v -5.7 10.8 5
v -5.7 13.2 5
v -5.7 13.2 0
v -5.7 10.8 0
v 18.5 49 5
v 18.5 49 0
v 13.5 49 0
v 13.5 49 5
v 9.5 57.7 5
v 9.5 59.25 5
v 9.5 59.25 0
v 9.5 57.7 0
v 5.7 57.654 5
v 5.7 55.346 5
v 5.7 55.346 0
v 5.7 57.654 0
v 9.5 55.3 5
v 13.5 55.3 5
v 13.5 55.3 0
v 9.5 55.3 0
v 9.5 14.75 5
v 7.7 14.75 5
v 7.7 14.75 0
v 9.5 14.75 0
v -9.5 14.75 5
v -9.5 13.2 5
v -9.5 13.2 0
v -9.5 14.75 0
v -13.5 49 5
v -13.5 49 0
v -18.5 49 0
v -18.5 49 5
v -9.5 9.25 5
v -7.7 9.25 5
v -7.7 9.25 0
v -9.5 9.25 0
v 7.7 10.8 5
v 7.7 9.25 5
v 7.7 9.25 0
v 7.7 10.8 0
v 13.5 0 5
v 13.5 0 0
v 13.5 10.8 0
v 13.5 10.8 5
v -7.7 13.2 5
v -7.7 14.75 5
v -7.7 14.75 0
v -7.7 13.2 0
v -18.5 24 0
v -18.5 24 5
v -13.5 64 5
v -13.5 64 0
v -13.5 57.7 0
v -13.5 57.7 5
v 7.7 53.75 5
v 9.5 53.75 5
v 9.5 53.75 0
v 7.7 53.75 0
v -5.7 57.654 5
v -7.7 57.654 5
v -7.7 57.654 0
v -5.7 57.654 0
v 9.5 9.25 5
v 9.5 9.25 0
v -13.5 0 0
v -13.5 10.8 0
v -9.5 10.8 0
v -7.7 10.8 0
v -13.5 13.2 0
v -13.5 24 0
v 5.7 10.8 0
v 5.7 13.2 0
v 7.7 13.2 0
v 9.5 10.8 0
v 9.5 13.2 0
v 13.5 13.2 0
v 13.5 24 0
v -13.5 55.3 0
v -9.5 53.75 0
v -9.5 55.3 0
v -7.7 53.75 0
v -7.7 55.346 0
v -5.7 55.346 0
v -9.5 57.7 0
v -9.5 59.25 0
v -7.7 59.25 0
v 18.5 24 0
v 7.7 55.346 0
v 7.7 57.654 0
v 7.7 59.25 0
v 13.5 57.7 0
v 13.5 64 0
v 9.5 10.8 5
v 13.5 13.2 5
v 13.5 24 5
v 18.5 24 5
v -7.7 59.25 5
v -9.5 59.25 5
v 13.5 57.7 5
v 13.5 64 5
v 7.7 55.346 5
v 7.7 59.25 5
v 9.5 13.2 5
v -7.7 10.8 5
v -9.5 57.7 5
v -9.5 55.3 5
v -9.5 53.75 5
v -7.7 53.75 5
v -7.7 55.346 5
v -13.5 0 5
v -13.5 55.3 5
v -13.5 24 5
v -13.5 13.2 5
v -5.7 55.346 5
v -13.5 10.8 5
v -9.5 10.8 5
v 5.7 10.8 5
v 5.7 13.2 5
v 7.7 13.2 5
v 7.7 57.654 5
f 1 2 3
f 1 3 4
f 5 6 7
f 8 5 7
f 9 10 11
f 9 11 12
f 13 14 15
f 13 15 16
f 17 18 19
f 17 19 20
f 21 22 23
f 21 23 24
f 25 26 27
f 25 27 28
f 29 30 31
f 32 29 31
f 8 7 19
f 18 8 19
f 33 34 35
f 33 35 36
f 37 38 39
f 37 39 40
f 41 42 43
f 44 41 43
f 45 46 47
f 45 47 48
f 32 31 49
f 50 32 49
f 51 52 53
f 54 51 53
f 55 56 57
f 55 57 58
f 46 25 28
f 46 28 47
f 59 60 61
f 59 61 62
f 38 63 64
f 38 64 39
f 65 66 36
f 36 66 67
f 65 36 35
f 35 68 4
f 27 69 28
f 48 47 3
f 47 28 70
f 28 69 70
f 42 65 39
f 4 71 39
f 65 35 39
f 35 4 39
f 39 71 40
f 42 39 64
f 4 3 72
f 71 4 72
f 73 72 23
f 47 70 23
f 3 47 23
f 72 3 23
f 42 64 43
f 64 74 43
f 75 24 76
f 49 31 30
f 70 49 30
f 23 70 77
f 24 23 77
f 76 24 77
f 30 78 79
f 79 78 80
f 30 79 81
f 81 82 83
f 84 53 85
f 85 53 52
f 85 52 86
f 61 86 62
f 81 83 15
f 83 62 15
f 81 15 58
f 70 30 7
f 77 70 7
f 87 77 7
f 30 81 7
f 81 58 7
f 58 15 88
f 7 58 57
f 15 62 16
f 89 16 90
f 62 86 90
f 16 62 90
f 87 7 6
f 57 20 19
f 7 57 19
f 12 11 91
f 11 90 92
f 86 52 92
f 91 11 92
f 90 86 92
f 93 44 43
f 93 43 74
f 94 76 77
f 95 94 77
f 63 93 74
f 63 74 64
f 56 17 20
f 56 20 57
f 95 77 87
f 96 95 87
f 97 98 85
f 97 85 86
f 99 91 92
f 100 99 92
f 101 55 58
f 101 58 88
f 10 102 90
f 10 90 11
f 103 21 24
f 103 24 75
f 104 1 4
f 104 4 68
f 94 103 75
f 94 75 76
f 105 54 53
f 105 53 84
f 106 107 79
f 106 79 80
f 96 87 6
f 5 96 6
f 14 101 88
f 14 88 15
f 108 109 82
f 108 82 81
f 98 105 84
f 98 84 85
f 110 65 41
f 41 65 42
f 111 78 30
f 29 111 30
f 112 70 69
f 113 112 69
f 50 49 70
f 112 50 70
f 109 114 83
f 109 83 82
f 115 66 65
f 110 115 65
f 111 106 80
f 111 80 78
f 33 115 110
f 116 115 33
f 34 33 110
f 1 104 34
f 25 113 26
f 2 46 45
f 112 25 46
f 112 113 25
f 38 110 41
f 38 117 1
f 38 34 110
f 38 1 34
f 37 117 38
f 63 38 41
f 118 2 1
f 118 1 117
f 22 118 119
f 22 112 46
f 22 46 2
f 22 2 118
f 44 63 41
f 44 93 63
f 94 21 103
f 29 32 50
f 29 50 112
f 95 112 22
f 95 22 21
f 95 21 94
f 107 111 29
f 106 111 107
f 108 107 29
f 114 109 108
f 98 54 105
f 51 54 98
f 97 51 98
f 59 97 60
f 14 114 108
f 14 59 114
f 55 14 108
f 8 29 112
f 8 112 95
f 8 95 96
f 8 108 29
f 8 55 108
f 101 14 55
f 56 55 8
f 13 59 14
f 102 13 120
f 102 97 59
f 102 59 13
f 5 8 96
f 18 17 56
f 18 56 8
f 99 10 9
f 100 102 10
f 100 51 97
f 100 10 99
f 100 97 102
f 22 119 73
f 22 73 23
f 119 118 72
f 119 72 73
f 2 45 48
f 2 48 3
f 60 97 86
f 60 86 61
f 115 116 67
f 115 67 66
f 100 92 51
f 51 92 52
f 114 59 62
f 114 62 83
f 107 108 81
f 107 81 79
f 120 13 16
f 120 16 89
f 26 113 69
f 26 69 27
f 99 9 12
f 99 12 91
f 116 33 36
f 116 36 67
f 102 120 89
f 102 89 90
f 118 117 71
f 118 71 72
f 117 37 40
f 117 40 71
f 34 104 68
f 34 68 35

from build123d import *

# Parameters (mm, degrees)
BOSS_EXTRUDE1_DEPTH = 5
CUT_EXTRUDE2_DEPTH  = 6


with BuildPart() as part:
    # Sketch1 → Boss-Extrude1 (new body)
    with BuildSketch(Plane.XY):
        Polygon((-13.5, 0), (13.5, 0), (13.5, 24), (18.5, 24), (18.5, 49), (13.5, 49), (13.5, 64), (-13.5, 64), (-13.5, 49), (-18.5, 49), (-18.5, 24), (-13.5, 24), align=None)
    extrude(amount=BOSS_EXTRUDE1_DEPTH)

    # Sketch2 → Cut-Extrude2 (cut, through all)
    with BuildSketch(Plane.XY.offset(5)):
        Polygon((-13.5, 56.5), (-13.5, 57.7), (-9.5, 57.7), (-9.5, 59.25), (-7.7, 59.25), (-7.7, 57.654169795), (-5.7, 57.654169795), (-5.7, 55.345830205), (-7.7, 55.345830205), (-7.7, 53.75), (-9.5, 53.75), (-9.5, 55.3), (-13.5, 55.3), align=None)
        Polygon((13.5, 56.5), (13.5, 55.3), (9.5, 55.3), (9.5, 53.75), (7.7, 53.75), (7.7, 55.345830205), (5.7, 55.345830205), (5.7, 57.654169795), (7.7, 57.654169795), (7.7, 59.25), (9.5, 59.25), (9.5, 57.7), (13.5, 57.7), align=None)
        Polygon((-13.5, 10.8), (-13.5, 13.2), (-9.5, 13.2), (-9.5, 14.75), (-7.7, 14.75), (-7.7, 13.2), (-5.7, 13.2), (-5.7, 10.8), (-7.7, 10.8), (-7.7, 9.25), (-9.5, 9.25), (-9.5, 10.8), align=None)
        Polygon((13.5, 10.8), (9.5, 10.8), (9.5, 9.25), (7.7, 9.25), (7.7, 10.8), (5.7, 10.8), (5.7, 13.2), (7.7, 13.2), (7.7, 14.75), (9.5, 14.75), (9.5, 13.2), (13.5, 13.2), align=None)
    extrude(amount=-CUT_EXTRUDE2_DEPTH, mode=Mode.SUBTRACT)


solid = part.part
